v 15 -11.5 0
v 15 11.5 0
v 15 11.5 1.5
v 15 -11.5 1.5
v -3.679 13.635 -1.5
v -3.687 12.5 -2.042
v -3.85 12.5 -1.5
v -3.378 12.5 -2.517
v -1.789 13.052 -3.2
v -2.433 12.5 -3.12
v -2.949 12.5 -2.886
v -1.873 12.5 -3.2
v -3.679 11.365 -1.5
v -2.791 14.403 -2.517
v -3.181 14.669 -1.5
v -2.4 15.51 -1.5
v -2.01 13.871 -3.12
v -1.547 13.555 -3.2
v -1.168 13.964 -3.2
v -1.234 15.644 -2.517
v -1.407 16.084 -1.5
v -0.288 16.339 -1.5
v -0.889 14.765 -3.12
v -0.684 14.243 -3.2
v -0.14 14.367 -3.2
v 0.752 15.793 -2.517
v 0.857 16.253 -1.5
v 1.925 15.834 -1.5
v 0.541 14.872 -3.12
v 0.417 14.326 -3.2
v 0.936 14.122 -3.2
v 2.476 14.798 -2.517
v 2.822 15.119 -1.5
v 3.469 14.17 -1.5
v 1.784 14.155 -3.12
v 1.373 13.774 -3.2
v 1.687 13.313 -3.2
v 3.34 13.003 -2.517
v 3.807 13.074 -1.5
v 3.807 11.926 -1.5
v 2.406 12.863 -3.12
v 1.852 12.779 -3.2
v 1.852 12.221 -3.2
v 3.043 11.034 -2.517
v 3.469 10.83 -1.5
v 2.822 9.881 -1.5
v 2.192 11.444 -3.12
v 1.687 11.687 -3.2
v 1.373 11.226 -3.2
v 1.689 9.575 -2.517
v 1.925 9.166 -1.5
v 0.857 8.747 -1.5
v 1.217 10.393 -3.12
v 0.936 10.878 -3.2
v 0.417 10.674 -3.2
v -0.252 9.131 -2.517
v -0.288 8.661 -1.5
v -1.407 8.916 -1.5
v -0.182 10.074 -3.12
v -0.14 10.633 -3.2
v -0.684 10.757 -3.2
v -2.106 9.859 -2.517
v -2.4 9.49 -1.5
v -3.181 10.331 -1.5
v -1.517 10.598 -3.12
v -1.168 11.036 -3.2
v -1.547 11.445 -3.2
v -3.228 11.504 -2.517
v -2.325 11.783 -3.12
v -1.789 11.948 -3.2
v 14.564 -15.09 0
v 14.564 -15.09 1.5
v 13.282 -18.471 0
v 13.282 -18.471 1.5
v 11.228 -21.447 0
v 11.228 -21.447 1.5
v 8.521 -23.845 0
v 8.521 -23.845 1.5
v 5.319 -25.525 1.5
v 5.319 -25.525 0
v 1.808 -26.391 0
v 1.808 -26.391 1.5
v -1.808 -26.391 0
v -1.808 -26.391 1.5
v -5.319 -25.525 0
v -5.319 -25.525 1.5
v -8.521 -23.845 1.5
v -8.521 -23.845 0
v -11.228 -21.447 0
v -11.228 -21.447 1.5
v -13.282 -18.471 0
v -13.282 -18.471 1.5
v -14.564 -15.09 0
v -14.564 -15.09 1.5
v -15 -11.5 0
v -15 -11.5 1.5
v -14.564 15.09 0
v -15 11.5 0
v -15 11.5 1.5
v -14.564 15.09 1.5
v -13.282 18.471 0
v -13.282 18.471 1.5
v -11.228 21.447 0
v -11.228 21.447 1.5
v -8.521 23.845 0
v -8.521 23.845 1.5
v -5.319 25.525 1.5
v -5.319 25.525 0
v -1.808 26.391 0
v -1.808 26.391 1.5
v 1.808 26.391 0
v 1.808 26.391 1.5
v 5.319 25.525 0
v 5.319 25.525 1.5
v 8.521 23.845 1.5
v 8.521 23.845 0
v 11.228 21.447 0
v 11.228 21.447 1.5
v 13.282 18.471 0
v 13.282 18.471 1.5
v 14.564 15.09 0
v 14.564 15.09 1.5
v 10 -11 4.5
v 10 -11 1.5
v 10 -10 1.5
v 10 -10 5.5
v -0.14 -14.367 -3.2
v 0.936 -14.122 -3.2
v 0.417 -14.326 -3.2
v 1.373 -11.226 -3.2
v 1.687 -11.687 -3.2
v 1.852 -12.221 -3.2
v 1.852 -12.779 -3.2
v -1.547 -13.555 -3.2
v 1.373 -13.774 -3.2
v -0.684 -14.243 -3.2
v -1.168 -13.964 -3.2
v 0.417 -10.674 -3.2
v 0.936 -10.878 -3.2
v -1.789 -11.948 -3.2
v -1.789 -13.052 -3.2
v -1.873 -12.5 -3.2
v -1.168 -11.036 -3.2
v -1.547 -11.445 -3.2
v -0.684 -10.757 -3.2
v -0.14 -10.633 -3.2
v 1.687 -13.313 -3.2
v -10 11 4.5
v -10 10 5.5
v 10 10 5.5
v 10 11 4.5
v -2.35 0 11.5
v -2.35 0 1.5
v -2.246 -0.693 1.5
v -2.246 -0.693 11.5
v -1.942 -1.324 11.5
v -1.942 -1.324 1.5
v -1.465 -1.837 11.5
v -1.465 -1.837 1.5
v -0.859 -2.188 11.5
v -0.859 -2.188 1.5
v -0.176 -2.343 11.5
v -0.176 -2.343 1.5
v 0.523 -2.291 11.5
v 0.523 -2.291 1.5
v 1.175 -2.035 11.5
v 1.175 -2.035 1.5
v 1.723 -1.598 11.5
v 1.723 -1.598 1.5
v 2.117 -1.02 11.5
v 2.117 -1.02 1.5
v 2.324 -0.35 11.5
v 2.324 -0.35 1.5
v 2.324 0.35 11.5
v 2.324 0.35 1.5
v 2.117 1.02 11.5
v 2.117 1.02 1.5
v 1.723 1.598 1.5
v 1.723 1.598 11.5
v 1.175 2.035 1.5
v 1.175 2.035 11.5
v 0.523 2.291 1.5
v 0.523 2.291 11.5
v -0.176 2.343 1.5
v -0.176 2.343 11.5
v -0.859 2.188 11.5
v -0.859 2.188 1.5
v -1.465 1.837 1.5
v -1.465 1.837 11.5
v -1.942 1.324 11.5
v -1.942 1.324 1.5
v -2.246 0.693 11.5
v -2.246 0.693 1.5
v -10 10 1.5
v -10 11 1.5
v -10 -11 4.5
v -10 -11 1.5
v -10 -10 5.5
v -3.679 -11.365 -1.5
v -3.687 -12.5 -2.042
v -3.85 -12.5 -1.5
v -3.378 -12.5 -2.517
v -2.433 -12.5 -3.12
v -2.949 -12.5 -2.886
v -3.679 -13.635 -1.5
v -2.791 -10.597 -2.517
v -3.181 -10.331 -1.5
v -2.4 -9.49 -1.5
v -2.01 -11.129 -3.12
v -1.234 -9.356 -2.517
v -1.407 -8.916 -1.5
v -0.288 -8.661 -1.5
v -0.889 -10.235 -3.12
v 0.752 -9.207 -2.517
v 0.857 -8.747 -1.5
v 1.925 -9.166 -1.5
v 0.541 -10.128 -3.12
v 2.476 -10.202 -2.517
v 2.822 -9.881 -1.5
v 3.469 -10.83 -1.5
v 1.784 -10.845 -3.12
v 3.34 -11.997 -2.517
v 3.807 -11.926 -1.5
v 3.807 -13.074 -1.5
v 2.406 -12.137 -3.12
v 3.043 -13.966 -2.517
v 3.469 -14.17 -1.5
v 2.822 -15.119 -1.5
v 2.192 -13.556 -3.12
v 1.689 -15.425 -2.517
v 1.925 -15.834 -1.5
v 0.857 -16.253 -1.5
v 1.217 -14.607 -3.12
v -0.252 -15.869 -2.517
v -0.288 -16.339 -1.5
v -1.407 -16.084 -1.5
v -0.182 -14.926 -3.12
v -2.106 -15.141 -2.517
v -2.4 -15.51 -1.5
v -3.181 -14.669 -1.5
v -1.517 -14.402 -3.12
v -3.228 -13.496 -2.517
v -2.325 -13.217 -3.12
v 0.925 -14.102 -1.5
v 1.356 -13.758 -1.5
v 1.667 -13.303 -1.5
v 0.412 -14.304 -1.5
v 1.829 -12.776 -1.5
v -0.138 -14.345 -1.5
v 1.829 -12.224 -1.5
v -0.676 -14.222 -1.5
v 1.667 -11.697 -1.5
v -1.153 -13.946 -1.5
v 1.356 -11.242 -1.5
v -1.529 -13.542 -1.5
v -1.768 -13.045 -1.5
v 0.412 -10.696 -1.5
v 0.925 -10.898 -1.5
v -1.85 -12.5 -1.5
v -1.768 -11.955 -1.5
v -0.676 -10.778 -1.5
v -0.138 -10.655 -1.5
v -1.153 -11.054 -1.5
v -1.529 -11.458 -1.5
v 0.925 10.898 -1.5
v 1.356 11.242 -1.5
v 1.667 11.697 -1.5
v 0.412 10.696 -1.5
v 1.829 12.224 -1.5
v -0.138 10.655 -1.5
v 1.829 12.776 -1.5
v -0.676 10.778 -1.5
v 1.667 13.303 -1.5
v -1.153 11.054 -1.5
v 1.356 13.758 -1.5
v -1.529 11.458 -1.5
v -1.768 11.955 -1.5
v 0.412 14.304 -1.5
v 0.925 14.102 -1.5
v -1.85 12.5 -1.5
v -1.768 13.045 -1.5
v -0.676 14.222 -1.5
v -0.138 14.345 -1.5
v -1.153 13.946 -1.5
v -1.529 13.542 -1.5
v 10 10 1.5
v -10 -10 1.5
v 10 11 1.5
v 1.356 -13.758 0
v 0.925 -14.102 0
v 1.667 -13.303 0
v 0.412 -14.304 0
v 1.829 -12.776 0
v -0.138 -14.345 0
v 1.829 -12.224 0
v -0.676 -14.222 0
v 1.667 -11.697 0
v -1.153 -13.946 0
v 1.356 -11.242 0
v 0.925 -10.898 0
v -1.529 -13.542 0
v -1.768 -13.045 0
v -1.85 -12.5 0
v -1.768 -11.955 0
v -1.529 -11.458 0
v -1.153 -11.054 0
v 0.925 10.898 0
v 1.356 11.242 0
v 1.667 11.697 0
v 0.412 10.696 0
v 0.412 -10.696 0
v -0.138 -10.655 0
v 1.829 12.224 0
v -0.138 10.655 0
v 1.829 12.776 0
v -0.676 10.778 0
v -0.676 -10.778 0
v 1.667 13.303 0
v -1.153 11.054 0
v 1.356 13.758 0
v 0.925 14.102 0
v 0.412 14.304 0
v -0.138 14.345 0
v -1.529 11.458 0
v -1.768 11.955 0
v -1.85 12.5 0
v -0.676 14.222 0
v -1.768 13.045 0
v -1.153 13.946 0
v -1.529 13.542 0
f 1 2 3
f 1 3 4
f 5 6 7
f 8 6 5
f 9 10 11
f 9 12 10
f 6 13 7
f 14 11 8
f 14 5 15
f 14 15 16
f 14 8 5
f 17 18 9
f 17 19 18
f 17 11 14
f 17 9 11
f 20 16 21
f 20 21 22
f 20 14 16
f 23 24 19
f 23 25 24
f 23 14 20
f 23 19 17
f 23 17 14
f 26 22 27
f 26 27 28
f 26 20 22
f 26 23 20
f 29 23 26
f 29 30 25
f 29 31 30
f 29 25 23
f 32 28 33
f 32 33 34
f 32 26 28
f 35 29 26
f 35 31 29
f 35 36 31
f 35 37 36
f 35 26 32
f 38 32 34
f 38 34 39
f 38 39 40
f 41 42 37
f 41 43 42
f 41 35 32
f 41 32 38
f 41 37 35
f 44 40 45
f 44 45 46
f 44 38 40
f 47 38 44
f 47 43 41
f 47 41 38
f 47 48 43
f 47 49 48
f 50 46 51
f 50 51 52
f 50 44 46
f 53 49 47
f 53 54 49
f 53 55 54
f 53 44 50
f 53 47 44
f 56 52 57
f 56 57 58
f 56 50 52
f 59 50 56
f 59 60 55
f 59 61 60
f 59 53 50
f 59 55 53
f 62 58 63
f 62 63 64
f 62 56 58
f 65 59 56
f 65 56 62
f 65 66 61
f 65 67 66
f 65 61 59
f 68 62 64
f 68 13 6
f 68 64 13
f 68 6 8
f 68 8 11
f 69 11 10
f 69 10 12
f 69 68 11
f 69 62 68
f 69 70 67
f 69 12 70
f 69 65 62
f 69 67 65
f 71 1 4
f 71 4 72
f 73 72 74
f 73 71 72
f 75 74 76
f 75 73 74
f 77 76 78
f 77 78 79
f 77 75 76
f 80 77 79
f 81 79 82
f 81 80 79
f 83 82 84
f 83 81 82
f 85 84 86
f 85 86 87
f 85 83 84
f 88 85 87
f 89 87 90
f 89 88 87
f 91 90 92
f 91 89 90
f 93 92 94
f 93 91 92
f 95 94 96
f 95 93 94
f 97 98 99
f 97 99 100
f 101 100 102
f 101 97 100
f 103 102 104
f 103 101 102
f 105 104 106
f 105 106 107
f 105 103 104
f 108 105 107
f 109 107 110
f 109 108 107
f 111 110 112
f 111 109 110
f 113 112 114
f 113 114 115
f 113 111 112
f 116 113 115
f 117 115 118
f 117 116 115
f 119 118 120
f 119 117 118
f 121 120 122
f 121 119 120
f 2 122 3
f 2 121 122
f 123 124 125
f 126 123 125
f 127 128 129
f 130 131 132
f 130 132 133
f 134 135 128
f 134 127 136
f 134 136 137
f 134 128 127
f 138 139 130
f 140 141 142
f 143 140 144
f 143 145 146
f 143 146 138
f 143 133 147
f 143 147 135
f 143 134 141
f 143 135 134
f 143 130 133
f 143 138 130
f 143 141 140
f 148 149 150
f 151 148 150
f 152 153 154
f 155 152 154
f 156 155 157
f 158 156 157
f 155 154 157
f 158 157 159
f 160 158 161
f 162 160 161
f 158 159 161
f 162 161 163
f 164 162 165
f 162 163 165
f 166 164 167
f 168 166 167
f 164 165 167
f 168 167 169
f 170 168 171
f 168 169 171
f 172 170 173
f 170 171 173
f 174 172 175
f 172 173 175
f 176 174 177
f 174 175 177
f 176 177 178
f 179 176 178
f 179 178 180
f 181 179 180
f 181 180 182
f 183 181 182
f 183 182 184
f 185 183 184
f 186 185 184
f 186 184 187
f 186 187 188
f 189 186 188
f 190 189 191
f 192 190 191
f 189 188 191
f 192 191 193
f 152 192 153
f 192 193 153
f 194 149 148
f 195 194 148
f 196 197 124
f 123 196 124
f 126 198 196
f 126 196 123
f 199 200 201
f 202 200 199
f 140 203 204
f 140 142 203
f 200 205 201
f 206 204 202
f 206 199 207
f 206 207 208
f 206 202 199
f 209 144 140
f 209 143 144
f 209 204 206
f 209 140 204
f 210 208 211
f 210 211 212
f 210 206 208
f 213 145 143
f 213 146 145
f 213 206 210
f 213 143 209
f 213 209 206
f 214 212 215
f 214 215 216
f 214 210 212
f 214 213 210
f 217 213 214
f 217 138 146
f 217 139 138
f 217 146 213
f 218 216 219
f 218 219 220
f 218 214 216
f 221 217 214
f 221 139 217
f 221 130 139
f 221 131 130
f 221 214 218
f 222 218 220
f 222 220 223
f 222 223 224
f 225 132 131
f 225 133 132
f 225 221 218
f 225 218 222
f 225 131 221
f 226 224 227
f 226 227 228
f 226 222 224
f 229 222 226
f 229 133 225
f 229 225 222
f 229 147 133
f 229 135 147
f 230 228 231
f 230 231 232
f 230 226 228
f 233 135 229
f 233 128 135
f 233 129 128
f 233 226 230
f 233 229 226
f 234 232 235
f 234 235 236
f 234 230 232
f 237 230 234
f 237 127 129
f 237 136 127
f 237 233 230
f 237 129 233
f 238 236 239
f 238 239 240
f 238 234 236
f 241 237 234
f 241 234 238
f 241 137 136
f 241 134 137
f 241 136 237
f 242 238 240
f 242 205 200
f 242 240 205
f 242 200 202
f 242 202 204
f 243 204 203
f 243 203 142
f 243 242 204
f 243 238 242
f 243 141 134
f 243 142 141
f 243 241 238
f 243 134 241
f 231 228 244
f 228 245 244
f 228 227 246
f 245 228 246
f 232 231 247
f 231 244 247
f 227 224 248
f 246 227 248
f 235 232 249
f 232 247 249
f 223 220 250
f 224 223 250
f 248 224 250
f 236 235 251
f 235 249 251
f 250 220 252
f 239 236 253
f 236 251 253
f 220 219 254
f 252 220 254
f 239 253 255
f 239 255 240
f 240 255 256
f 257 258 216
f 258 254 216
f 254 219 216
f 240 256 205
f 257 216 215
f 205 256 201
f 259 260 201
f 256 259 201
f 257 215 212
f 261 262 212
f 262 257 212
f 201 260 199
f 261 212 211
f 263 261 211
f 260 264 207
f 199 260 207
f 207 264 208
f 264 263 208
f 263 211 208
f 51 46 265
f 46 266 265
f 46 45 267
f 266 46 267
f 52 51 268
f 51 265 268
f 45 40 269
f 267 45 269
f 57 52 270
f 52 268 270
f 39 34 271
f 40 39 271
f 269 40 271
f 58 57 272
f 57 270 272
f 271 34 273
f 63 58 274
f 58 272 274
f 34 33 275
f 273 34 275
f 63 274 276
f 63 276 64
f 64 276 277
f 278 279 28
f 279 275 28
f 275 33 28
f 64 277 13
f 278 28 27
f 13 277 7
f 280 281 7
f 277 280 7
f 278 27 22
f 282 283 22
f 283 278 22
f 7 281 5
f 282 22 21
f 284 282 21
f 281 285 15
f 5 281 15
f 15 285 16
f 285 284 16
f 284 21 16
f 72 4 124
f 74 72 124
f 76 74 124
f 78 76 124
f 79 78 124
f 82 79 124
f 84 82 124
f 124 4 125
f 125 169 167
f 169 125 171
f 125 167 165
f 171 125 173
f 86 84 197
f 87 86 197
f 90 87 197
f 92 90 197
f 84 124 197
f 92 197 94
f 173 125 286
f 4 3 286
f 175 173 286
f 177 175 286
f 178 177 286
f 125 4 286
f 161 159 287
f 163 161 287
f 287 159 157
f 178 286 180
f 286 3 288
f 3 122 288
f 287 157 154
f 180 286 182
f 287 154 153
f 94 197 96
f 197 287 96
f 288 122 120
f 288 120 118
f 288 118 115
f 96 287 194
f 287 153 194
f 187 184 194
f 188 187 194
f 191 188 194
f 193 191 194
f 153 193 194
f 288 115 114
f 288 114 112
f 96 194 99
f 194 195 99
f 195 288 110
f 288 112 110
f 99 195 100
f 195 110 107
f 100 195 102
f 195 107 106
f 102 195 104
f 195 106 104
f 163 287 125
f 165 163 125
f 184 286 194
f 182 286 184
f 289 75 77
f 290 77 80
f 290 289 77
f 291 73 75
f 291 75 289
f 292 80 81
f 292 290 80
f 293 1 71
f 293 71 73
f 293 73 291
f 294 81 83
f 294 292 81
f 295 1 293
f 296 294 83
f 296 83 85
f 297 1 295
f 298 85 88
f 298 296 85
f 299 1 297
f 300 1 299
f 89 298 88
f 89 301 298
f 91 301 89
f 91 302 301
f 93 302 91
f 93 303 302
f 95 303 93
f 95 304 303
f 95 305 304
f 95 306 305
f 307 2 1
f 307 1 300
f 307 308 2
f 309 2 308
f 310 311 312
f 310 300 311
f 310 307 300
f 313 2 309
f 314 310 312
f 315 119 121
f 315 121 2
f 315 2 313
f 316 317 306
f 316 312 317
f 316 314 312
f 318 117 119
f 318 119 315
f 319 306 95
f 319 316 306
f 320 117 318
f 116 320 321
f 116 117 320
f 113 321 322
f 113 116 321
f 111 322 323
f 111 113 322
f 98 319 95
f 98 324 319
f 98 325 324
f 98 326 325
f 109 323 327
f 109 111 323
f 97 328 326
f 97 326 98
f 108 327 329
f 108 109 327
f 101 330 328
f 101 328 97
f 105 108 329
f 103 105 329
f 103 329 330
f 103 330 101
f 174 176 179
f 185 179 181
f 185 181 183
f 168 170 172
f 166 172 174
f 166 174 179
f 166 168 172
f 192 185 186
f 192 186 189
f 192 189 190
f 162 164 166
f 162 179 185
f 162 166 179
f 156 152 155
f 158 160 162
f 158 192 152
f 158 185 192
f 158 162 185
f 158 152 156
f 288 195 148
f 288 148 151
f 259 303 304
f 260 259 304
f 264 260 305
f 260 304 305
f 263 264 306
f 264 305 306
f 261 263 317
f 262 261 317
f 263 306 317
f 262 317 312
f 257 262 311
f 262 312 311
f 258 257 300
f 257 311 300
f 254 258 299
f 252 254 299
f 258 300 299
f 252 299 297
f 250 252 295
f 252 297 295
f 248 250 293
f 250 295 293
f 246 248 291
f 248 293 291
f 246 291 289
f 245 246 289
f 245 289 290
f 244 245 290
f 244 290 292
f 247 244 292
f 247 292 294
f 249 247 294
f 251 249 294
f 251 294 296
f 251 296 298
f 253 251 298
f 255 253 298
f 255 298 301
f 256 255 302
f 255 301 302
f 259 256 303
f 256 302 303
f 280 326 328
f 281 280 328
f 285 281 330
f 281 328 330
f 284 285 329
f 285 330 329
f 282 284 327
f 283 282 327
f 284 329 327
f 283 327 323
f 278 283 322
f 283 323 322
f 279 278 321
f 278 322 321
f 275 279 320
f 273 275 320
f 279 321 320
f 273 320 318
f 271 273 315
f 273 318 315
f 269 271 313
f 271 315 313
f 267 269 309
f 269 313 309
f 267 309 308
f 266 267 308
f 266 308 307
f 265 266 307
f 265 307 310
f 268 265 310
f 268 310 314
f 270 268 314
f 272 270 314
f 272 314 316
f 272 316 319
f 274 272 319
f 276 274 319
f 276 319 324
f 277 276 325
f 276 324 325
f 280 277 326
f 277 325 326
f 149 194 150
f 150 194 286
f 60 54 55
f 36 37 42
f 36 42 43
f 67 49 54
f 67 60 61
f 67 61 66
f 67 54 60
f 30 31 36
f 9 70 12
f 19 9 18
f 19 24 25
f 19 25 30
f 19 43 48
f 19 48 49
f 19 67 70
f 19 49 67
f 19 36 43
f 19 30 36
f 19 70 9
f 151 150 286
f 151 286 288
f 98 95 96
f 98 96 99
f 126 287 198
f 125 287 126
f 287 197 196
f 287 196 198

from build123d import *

# Parameters (mm, degrees)
DODANIE_WYCI_GNI_CIE2_DEPTH = 1.5
SZKIC37_R                   = 1.85
DODANIE_WYCI_GNI_CIE3_DEPTH = 1.5
SZKIC38_R                   = 3.85
DODANIE_WYCI_GNI_CIE4_DEPTH = 1.7
ZAOKR_GLENIE1_R             = 2
SZKIC39_R                   = 2.35
DODANIE_WYCI_GNI_CIE5_DEPTH = 10
SZKIC40_W                   = 20
SZKIC40_H                   = 1
DODANIE_WYCI_GNI_CIE6_DEPTH = 4
SFAZOWANIE1_SIZE            = 1


# Some blends are built 0.0001 mm under size
with BuildPart() as part:
    # Szkic35 → Dodanie-wyciągnięcie2 (new body)
    with BuildSketch(Plane.XY):
        with BuildLine():
            Line((-15, -11.5), (-15, 11.5))
            ThreePointArc((-15, 11.5), (0, 26.5), (15, 11.5))
            Line((15, 11.5), (15, -11.5))
            ThreePointArc((15, -11.5), (0, -26.5), (-15, -11.5))
        make_face()
    extrude(amount=DODANIE_WYCI_GNI_CIE2_DEPTH)

    # Szkic37 → Dodanie-wyciągnięcie3 (add)
    with BuildSketch(Plane(origin=(0, 0, 0), x_dir=(-1, 0, 0), z_dir=(0, 0, -1))):
        with Locations((0, 12.5)):
            Circle(SZKIC37_R)
        with Locations((0, -12.5)):
            Circle(SZKIC37_R)
    extrude(amount=DODANIE_WYCI_GNI_CIE3_DEPTH)

    # Szkic38 → Dodanie-wyciągnięcie4 (add)
    with BuildSketch(Plane(origin=(0, 0, -1.5), x_dir=(-1, 0, 0), z_dir=(0, 0, -1))):
        with Locations((0, 12.5)):
            Circle(SZKIC38_R)
        with Locations((0, -12.5)):
            Circle(SZKIC38_R)
    extrude(amount=DODANIE_WYCI_GNI_CIE4_DEPTH)

    # Zaokrąglenie1
    # the kernel refuses this fillet: 2 mm, written as the material it takes off along each edge
    with BuildSketch(Plane(origin=(0, 12.5, -3.2), x_dir=(-1, 0, 0), z_dir=(0, -1, 0))) as zaokr_glenie1_piece_1:
        with BuildLine():
            CenterArc((1.872628007, -2), ZAOKR_GLENIE1_R, 8.626926559, 81.373073441)
            Line((1.872628007, 0), (1.872628007, 0.04))
            Line((1.872628007, 0.04), (3.85, 0.04))
            Line((3.85, 0.04), (3.89, 0))
            ThreePointArc((3.89, 0), (3.89, -0.85), (3.88954744, -1.694))
            Line((3.88954744, -1.694), (3.85, -1.7))
        make_face()
    revolve(axis=Axis((0, 12.5, -3.2), (0, 0, -1)), mode=Mode.SUBTRACT)
    with BuildSketch(Plane(origin=(0, -12.5, -3.2), x_dir=(-1, 0, 0), z_dir=(0, -1, 0))) as zaokr_glenie1_piece_2:
        with BuildLine():
            CenterArc((1.872628007, -2), ZAOKR_GLENIE1_R, 8.626926559, 81.373073441)
            Line((1.872628007, 0), (1.872628007, 0.04))
            Line((1.872628007, 0.04), (3.85, 0.04))
            Line((3.85, 0.04), (3.89, 0))
            ThreePointArc((3.89, 0), (3.89, -0.85), (3.88954744, -1.694))
            Line((3.88954744, -1.694), (3.85, -1.7))
        make_face()
    revolve(axis=Axis((0, -12.5, -3.2), (0, 0, -1)), mode=Mode.SUBTRACT)

    # Szkic39 → Dodanie-wyciągnięcie5 (add)
    with BuildSketch(Plane.XY.offset(1.5)):
        with Locations(Location((0, 0, 0), (0, 0, 180))):
            Circle(SZKIC39_R)
    extrude(amount=DODANIE_WYCI_GNI_CIE5_DEPTH)

    # Szkic40 → Dodanie-wyciągnięcie6 (add)
    with BuildSketch(Plane.XY.offset(1.5)):
        with Locations((0, 10.5)):
            Rectangle(SZKIC40_W, SZKIC40_H)
        with Locations((0, -10.5)):
            Rectangle(SZKIC40_W, SZKIC40_H)
    extrude(amount=DODANIE_WYCI_GNI_CIE6_DEPTH)

    # Sfazowanie1
    sfazowanie1_edges = [part.edges().sort_by_distance(p)[0] for p in [
        (0, 11, 5.5),
        (0, -11, 5.5),
    ]]
    chamfer(sfazowanie1_edges, length=SFAZOWANIE1_SIZE - 0.0001)  # a hair under: the kernel refuses the full size


solid = part.part
